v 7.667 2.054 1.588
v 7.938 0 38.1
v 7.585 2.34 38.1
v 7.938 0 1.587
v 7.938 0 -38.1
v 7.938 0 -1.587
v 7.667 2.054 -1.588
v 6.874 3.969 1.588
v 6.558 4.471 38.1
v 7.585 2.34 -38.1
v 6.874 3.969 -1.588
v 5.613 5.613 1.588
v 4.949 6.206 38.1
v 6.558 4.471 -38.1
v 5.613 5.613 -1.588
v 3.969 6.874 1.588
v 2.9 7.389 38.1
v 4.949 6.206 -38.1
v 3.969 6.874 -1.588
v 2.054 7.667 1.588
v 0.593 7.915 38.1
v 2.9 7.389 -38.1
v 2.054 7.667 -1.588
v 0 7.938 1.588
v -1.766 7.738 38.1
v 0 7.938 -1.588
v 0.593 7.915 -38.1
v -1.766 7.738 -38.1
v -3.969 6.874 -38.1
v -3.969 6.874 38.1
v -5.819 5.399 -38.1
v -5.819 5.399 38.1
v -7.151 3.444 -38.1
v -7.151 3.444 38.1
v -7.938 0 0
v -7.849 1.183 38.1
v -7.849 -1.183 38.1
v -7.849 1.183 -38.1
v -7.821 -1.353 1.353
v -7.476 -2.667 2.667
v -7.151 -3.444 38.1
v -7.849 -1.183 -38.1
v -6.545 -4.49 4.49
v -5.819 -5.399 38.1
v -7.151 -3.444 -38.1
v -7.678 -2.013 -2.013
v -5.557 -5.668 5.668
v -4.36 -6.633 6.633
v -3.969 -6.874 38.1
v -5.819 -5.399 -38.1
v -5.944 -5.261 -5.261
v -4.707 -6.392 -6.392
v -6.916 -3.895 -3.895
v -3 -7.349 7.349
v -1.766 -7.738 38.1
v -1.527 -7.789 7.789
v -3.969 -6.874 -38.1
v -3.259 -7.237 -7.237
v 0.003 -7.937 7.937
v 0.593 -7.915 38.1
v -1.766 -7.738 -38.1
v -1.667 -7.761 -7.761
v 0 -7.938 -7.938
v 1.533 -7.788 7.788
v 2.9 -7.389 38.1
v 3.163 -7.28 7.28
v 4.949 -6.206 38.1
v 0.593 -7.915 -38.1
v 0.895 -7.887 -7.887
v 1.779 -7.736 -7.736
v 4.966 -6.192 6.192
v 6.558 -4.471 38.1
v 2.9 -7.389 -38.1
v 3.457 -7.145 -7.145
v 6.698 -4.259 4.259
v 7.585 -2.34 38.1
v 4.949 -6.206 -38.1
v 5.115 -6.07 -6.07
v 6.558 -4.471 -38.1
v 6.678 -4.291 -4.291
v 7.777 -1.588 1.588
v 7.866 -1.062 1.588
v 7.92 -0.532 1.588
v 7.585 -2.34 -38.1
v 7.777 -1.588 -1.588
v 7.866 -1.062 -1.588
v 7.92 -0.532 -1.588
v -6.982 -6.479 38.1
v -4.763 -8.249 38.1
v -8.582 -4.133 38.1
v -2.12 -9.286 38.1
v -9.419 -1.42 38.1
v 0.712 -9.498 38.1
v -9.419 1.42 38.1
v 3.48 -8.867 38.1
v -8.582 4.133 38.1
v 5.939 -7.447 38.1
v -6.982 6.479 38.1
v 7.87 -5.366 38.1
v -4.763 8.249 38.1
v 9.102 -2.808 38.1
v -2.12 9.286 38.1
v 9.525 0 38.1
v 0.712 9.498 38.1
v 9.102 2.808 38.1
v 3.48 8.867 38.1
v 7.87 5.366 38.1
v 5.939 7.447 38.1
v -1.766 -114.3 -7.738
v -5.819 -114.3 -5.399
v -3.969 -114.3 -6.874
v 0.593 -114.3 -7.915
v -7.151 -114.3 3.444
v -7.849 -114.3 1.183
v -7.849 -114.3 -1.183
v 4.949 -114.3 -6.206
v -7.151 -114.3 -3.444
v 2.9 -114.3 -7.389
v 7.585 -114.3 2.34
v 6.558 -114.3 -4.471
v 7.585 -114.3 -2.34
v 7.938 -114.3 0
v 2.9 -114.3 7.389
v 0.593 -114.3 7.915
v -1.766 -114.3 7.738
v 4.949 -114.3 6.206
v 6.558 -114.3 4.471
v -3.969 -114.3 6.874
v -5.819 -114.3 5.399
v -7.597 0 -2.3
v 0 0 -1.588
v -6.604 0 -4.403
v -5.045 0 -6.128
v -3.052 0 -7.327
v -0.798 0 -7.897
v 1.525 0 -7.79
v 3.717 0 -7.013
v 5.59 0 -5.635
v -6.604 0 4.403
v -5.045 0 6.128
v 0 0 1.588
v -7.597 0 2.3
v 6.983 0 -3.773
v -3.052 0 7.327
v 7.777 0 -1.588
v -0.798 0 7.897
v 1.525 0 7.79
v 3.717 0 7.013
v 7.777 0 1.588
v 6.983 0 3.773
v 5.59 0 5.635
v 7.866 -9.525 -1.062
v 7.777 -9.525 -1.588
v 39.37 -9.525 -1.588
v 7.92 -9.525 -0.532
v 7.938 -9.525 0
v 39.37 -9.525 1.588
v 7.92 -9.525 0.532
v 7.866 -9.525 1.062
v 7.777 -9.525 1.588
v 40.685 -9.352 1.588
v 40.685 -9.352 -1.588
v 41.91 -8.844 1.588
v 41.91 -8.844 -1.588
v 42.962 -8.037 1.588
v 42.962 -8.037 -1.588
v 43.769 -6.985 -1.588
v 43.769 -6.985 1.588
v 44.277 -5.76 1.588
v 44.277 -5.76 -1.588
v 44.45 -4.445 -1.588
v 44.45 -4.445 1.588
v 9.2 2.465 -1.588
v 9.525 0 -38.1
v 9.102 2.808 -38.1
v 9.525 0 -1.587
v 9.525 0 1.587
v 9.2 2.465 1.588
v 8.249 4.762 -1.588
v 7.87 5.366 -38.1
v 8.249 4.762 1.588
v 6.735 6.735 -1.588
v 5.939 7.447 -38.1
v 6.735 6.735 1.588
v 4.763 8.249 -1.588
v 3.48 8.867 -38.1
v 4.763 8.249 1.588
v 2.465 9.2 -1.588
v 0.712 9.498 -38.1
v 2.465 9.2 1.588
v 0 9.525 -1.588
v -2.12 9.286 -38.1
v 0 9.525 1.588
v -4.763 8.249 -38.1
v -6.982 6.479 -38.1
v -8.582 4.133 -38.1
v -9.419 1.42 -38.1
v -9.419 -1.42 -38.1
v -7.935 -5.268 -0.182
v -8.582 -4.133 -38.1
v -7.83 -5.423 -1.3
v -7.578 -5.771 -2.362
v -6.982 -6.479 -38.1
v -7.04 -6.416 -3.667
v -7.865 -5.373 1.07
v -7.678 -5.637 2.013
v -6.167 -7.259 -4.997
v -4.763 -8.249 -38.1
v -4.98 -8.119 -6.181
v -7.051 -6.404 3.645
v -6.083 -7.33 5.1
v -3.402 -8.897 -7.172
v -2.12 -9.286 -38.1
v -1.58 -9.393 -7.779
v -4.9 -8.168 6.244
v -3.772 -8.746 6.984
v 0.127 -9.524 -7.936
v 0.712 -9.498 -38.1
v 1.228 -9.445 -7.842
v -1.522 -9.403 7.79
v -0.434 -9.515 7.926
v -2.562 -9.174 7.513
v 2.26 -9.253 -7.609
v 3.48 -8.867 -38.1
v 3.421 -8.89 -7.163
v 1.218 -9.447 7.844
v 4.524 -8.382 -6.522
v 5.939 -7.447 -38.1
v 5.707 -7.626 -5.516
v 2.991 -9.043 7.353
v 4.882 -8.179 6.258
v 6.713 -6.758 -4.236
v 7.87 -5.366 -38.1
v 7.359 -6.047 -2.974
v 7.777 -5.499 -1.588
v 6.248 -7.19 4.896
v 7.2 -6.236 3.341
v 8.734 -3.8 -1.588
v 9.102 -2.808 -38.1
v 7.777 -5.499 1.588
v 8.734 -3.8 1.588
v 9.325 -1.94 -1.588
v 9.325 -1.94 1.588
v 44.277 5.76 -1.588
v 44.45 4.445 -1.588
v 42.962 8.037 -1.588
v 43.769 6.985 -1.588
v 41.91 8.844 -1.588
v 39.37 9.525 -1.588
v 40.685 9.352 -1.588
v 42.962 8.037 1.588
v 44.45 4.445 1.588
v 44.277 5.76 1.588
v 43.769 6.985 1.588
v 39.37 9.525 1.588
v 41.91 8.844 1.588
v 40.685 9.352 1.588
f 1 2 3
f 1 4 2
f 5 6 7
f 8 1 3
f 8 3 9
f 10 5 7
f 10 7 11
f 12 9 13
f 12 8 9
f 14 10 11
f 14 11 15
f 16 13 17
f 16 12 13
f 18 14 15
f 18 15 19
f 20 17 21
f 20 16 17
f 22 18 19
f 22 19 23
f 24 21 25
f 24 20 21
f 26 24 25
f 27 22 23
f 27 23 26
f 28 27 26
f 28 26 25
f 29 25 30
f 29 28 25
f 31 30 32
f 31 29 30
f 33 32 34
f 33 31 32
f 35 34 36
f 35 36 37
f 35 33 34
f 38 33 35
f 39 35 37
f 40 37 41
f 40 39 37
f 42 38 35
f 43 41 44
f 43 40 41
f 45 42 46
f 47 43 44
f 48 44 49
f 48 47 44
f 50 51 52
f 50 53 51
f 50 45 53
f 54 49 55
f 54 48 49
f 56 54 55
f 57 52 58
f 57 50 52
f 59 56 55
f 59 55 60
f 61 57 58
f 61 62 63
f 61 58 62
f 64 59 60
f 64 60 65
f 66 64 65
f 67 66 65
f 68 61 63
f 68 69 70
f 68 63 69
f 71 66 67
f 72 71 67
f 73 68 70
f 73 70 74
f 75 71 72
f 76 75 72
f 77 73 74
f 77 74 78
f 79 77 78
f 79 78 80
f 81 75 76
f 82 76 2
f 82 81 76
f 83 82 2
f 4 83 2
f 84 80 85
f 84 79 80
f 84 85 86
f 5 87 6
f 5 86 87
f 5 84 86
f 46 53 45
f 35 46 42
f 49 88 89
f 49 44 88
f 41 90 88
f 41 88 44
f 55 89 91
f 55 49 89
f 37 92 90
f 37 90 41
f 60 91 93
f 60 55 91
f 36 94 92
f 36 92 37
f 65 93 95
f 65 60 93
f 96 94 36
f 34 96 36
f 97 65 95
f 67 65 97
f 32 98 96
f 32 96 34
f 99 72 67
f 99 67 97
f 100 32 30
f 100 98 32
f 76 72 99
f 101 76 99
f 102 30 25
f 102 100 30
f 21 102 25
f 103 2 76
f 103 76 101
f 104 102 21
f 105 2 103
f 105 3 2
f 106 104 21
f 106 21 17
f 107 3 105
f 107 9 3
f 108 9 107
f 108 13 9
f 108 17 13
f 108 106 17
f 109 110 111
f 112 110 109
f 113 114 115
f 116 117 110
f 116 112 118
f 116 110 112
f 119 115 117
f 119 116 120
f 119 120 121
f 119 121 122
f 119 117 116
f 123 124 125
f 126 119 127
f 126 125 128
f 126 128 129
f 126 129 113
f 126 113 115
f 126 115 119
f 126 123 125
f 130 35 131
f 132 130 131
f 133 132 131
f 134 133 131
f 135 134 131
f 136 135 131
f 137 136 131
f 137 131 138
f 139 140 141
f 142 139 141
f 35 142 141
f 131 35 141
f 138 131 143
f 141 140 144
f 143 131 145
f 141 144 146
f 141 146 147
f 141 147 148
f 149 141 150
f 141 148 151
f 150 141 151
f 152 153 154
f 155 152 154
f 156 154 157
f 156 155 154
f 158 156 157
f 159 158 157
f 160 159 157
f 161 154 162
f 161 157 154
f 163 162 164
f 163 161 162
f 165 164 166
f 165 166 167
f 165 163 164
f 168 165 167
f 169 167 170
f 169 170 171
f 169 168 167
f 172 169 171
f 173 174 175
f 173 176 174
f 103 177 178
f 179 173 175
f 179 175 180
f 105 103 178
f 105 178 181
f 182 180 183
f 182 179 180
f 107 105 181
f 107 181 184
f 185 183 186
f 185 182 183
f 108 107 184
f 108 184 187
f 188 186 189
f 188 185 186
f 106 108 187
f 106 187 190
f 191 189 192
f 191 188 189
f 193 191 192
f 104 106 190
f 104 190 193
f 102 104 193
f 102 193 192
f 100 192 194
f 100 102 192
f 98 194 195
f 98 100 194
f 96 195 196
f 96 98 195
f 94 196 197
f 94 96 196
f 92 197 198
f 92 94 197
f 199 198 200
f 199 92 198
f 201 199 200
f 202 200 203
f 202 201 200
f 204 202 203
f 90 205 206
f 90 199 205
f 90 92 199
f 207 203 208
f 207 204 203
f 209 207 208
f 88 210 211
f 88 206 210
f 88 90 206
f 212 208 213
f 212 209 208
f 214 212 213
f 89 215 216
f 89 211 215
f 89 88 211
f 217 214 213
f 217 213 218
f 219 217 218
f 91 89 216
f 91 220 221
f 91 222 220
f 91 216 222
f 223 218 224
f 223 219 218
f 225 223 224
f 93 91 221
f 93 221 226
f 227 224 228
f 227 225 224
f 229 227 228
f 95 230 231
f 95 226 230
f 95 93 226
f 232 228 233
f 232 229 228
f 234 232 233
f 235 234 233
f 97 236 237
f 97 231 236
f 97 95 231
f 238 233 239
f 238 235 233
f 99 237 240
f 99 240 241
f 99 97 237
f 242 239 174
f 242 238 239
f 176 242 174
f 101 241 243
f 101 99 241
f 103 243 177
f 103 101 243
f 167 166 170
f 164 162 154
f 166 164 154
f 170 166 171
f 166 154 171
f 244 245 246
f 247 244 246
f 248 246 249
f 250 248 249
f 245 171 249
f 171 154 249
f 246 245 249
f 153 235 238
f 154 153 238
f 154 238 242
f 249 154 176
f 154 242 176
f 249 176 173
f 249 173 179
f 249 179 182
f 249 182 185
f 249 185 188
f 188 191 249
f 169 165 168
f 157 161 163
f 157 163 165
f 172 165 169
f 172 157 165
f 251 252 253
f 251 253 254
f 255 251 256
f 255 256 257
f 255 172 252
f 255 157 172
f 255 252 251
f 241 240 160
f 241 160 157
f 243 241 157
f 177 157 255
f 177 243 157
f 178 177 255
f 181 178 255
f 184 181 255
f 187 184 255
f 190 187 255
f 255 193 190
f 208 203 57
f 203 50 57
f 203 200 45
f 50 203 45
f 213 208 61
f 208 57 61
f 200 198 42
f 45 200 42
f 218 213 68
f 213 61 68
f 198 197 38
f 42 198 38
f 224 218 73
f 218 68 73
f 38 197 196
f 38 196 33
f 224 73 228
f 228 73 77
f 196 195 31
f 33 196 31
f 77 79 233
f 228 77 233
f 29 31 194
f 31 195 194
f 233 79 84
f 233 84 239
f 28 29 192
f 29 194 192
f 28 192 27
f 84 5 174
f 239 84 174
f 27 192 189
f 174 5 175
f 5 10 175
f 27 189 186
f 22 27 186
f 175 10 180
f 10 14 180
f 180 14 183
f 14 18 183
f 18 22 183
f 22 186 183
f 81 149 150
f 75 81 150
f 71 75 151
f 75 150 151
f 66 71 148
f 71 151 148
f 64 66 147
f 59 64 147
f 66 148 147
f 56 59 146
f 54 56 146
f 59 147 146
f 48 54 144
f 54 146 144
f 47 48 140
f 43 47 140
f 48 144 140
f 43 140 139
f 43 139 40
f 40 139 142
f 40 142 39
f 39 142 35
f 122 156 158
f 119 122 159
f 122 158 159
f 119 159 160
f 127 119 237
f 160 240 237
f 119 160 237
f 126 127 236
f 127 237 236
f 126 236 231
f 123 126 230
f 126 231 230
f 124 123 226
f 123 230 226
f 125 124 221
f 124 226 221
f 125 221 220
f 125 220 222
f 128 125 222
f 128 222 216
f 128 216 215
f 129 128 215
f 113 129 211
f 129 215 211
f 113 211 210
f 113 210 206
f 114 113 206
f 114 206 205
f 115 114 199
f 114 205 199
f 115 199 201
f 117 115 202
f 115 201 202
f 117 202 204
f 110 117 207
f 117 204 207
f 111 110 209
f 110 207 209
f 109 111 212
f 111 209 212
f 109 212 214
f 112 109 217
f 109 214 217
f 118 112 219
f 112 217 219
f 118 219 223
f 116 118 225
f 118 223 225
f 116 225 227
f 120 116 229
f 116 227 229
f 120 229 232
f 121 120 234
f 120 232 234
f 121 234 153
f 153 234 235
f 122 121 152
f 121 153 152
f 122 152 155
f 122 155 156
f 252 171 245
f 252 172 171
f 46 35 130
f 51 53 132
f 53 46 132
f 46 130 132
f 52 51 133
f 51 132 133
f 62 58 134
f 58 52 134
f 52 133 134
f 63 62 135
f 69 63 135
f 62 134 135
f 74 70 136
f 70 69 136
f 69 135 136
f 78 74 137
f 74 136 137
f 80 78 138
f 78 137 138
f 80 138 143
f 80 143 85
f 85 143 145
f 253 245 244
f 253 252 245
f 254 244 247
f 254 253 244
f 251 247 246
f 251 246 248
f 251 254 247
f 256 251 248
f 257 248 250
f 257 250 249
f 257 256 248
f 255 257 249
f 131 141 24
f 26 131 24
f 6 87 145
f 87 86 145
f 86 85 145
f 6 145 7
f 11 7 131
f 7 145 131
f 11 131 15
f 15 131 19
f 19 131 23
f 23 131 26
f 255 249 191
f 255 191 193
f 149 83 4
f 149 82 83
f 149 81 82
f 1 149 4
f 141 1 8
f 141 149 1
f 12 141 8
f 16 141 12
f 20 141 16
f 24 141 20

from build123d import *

# Parameters (mm, degrees)
F0_R     = 9.525
F0_R_2   = 7.9375
F1_DEPTH = 38.1
F2_W     = 19.05
F2_H     = 3.175
F3_DEPTH = 44.45
F4_R     = 5.08
F5_R     = 7.9375
F6_DEPTH = 114.3


with BuildPart() as f1:
    # F0 (on Top) → F1 (new body, symmetric)
    with BuildSketch(Plane.XY):
        Circle(F0_R)
        Circle(F0_R_2, mode=Mode.SUBTRACT)
    extrude(amount=F1_DEPTH, both=True)

    # F2 (on Right) → F3 (join)
    with BuildSketch(Plane.YZ):
        Rectangle(F2_W, F2_H)
    extrude(amount=F3_DEPTH)

    # F4
    f4_edges = [f1.edges().sort_by_distance(p)[0] for p in [
        (44.45, -9.525, 0),
        (44.45, 9.525, 0),
    ]]
    fillet(f4_edges, radius=F4_R)

    # F5 (on Front) → F6 (join)
    with BuildSketch(Plane.XZ):
        Circle(F5_R)
    extrude(amount=F6_DEPTH)


solid = f1.part
